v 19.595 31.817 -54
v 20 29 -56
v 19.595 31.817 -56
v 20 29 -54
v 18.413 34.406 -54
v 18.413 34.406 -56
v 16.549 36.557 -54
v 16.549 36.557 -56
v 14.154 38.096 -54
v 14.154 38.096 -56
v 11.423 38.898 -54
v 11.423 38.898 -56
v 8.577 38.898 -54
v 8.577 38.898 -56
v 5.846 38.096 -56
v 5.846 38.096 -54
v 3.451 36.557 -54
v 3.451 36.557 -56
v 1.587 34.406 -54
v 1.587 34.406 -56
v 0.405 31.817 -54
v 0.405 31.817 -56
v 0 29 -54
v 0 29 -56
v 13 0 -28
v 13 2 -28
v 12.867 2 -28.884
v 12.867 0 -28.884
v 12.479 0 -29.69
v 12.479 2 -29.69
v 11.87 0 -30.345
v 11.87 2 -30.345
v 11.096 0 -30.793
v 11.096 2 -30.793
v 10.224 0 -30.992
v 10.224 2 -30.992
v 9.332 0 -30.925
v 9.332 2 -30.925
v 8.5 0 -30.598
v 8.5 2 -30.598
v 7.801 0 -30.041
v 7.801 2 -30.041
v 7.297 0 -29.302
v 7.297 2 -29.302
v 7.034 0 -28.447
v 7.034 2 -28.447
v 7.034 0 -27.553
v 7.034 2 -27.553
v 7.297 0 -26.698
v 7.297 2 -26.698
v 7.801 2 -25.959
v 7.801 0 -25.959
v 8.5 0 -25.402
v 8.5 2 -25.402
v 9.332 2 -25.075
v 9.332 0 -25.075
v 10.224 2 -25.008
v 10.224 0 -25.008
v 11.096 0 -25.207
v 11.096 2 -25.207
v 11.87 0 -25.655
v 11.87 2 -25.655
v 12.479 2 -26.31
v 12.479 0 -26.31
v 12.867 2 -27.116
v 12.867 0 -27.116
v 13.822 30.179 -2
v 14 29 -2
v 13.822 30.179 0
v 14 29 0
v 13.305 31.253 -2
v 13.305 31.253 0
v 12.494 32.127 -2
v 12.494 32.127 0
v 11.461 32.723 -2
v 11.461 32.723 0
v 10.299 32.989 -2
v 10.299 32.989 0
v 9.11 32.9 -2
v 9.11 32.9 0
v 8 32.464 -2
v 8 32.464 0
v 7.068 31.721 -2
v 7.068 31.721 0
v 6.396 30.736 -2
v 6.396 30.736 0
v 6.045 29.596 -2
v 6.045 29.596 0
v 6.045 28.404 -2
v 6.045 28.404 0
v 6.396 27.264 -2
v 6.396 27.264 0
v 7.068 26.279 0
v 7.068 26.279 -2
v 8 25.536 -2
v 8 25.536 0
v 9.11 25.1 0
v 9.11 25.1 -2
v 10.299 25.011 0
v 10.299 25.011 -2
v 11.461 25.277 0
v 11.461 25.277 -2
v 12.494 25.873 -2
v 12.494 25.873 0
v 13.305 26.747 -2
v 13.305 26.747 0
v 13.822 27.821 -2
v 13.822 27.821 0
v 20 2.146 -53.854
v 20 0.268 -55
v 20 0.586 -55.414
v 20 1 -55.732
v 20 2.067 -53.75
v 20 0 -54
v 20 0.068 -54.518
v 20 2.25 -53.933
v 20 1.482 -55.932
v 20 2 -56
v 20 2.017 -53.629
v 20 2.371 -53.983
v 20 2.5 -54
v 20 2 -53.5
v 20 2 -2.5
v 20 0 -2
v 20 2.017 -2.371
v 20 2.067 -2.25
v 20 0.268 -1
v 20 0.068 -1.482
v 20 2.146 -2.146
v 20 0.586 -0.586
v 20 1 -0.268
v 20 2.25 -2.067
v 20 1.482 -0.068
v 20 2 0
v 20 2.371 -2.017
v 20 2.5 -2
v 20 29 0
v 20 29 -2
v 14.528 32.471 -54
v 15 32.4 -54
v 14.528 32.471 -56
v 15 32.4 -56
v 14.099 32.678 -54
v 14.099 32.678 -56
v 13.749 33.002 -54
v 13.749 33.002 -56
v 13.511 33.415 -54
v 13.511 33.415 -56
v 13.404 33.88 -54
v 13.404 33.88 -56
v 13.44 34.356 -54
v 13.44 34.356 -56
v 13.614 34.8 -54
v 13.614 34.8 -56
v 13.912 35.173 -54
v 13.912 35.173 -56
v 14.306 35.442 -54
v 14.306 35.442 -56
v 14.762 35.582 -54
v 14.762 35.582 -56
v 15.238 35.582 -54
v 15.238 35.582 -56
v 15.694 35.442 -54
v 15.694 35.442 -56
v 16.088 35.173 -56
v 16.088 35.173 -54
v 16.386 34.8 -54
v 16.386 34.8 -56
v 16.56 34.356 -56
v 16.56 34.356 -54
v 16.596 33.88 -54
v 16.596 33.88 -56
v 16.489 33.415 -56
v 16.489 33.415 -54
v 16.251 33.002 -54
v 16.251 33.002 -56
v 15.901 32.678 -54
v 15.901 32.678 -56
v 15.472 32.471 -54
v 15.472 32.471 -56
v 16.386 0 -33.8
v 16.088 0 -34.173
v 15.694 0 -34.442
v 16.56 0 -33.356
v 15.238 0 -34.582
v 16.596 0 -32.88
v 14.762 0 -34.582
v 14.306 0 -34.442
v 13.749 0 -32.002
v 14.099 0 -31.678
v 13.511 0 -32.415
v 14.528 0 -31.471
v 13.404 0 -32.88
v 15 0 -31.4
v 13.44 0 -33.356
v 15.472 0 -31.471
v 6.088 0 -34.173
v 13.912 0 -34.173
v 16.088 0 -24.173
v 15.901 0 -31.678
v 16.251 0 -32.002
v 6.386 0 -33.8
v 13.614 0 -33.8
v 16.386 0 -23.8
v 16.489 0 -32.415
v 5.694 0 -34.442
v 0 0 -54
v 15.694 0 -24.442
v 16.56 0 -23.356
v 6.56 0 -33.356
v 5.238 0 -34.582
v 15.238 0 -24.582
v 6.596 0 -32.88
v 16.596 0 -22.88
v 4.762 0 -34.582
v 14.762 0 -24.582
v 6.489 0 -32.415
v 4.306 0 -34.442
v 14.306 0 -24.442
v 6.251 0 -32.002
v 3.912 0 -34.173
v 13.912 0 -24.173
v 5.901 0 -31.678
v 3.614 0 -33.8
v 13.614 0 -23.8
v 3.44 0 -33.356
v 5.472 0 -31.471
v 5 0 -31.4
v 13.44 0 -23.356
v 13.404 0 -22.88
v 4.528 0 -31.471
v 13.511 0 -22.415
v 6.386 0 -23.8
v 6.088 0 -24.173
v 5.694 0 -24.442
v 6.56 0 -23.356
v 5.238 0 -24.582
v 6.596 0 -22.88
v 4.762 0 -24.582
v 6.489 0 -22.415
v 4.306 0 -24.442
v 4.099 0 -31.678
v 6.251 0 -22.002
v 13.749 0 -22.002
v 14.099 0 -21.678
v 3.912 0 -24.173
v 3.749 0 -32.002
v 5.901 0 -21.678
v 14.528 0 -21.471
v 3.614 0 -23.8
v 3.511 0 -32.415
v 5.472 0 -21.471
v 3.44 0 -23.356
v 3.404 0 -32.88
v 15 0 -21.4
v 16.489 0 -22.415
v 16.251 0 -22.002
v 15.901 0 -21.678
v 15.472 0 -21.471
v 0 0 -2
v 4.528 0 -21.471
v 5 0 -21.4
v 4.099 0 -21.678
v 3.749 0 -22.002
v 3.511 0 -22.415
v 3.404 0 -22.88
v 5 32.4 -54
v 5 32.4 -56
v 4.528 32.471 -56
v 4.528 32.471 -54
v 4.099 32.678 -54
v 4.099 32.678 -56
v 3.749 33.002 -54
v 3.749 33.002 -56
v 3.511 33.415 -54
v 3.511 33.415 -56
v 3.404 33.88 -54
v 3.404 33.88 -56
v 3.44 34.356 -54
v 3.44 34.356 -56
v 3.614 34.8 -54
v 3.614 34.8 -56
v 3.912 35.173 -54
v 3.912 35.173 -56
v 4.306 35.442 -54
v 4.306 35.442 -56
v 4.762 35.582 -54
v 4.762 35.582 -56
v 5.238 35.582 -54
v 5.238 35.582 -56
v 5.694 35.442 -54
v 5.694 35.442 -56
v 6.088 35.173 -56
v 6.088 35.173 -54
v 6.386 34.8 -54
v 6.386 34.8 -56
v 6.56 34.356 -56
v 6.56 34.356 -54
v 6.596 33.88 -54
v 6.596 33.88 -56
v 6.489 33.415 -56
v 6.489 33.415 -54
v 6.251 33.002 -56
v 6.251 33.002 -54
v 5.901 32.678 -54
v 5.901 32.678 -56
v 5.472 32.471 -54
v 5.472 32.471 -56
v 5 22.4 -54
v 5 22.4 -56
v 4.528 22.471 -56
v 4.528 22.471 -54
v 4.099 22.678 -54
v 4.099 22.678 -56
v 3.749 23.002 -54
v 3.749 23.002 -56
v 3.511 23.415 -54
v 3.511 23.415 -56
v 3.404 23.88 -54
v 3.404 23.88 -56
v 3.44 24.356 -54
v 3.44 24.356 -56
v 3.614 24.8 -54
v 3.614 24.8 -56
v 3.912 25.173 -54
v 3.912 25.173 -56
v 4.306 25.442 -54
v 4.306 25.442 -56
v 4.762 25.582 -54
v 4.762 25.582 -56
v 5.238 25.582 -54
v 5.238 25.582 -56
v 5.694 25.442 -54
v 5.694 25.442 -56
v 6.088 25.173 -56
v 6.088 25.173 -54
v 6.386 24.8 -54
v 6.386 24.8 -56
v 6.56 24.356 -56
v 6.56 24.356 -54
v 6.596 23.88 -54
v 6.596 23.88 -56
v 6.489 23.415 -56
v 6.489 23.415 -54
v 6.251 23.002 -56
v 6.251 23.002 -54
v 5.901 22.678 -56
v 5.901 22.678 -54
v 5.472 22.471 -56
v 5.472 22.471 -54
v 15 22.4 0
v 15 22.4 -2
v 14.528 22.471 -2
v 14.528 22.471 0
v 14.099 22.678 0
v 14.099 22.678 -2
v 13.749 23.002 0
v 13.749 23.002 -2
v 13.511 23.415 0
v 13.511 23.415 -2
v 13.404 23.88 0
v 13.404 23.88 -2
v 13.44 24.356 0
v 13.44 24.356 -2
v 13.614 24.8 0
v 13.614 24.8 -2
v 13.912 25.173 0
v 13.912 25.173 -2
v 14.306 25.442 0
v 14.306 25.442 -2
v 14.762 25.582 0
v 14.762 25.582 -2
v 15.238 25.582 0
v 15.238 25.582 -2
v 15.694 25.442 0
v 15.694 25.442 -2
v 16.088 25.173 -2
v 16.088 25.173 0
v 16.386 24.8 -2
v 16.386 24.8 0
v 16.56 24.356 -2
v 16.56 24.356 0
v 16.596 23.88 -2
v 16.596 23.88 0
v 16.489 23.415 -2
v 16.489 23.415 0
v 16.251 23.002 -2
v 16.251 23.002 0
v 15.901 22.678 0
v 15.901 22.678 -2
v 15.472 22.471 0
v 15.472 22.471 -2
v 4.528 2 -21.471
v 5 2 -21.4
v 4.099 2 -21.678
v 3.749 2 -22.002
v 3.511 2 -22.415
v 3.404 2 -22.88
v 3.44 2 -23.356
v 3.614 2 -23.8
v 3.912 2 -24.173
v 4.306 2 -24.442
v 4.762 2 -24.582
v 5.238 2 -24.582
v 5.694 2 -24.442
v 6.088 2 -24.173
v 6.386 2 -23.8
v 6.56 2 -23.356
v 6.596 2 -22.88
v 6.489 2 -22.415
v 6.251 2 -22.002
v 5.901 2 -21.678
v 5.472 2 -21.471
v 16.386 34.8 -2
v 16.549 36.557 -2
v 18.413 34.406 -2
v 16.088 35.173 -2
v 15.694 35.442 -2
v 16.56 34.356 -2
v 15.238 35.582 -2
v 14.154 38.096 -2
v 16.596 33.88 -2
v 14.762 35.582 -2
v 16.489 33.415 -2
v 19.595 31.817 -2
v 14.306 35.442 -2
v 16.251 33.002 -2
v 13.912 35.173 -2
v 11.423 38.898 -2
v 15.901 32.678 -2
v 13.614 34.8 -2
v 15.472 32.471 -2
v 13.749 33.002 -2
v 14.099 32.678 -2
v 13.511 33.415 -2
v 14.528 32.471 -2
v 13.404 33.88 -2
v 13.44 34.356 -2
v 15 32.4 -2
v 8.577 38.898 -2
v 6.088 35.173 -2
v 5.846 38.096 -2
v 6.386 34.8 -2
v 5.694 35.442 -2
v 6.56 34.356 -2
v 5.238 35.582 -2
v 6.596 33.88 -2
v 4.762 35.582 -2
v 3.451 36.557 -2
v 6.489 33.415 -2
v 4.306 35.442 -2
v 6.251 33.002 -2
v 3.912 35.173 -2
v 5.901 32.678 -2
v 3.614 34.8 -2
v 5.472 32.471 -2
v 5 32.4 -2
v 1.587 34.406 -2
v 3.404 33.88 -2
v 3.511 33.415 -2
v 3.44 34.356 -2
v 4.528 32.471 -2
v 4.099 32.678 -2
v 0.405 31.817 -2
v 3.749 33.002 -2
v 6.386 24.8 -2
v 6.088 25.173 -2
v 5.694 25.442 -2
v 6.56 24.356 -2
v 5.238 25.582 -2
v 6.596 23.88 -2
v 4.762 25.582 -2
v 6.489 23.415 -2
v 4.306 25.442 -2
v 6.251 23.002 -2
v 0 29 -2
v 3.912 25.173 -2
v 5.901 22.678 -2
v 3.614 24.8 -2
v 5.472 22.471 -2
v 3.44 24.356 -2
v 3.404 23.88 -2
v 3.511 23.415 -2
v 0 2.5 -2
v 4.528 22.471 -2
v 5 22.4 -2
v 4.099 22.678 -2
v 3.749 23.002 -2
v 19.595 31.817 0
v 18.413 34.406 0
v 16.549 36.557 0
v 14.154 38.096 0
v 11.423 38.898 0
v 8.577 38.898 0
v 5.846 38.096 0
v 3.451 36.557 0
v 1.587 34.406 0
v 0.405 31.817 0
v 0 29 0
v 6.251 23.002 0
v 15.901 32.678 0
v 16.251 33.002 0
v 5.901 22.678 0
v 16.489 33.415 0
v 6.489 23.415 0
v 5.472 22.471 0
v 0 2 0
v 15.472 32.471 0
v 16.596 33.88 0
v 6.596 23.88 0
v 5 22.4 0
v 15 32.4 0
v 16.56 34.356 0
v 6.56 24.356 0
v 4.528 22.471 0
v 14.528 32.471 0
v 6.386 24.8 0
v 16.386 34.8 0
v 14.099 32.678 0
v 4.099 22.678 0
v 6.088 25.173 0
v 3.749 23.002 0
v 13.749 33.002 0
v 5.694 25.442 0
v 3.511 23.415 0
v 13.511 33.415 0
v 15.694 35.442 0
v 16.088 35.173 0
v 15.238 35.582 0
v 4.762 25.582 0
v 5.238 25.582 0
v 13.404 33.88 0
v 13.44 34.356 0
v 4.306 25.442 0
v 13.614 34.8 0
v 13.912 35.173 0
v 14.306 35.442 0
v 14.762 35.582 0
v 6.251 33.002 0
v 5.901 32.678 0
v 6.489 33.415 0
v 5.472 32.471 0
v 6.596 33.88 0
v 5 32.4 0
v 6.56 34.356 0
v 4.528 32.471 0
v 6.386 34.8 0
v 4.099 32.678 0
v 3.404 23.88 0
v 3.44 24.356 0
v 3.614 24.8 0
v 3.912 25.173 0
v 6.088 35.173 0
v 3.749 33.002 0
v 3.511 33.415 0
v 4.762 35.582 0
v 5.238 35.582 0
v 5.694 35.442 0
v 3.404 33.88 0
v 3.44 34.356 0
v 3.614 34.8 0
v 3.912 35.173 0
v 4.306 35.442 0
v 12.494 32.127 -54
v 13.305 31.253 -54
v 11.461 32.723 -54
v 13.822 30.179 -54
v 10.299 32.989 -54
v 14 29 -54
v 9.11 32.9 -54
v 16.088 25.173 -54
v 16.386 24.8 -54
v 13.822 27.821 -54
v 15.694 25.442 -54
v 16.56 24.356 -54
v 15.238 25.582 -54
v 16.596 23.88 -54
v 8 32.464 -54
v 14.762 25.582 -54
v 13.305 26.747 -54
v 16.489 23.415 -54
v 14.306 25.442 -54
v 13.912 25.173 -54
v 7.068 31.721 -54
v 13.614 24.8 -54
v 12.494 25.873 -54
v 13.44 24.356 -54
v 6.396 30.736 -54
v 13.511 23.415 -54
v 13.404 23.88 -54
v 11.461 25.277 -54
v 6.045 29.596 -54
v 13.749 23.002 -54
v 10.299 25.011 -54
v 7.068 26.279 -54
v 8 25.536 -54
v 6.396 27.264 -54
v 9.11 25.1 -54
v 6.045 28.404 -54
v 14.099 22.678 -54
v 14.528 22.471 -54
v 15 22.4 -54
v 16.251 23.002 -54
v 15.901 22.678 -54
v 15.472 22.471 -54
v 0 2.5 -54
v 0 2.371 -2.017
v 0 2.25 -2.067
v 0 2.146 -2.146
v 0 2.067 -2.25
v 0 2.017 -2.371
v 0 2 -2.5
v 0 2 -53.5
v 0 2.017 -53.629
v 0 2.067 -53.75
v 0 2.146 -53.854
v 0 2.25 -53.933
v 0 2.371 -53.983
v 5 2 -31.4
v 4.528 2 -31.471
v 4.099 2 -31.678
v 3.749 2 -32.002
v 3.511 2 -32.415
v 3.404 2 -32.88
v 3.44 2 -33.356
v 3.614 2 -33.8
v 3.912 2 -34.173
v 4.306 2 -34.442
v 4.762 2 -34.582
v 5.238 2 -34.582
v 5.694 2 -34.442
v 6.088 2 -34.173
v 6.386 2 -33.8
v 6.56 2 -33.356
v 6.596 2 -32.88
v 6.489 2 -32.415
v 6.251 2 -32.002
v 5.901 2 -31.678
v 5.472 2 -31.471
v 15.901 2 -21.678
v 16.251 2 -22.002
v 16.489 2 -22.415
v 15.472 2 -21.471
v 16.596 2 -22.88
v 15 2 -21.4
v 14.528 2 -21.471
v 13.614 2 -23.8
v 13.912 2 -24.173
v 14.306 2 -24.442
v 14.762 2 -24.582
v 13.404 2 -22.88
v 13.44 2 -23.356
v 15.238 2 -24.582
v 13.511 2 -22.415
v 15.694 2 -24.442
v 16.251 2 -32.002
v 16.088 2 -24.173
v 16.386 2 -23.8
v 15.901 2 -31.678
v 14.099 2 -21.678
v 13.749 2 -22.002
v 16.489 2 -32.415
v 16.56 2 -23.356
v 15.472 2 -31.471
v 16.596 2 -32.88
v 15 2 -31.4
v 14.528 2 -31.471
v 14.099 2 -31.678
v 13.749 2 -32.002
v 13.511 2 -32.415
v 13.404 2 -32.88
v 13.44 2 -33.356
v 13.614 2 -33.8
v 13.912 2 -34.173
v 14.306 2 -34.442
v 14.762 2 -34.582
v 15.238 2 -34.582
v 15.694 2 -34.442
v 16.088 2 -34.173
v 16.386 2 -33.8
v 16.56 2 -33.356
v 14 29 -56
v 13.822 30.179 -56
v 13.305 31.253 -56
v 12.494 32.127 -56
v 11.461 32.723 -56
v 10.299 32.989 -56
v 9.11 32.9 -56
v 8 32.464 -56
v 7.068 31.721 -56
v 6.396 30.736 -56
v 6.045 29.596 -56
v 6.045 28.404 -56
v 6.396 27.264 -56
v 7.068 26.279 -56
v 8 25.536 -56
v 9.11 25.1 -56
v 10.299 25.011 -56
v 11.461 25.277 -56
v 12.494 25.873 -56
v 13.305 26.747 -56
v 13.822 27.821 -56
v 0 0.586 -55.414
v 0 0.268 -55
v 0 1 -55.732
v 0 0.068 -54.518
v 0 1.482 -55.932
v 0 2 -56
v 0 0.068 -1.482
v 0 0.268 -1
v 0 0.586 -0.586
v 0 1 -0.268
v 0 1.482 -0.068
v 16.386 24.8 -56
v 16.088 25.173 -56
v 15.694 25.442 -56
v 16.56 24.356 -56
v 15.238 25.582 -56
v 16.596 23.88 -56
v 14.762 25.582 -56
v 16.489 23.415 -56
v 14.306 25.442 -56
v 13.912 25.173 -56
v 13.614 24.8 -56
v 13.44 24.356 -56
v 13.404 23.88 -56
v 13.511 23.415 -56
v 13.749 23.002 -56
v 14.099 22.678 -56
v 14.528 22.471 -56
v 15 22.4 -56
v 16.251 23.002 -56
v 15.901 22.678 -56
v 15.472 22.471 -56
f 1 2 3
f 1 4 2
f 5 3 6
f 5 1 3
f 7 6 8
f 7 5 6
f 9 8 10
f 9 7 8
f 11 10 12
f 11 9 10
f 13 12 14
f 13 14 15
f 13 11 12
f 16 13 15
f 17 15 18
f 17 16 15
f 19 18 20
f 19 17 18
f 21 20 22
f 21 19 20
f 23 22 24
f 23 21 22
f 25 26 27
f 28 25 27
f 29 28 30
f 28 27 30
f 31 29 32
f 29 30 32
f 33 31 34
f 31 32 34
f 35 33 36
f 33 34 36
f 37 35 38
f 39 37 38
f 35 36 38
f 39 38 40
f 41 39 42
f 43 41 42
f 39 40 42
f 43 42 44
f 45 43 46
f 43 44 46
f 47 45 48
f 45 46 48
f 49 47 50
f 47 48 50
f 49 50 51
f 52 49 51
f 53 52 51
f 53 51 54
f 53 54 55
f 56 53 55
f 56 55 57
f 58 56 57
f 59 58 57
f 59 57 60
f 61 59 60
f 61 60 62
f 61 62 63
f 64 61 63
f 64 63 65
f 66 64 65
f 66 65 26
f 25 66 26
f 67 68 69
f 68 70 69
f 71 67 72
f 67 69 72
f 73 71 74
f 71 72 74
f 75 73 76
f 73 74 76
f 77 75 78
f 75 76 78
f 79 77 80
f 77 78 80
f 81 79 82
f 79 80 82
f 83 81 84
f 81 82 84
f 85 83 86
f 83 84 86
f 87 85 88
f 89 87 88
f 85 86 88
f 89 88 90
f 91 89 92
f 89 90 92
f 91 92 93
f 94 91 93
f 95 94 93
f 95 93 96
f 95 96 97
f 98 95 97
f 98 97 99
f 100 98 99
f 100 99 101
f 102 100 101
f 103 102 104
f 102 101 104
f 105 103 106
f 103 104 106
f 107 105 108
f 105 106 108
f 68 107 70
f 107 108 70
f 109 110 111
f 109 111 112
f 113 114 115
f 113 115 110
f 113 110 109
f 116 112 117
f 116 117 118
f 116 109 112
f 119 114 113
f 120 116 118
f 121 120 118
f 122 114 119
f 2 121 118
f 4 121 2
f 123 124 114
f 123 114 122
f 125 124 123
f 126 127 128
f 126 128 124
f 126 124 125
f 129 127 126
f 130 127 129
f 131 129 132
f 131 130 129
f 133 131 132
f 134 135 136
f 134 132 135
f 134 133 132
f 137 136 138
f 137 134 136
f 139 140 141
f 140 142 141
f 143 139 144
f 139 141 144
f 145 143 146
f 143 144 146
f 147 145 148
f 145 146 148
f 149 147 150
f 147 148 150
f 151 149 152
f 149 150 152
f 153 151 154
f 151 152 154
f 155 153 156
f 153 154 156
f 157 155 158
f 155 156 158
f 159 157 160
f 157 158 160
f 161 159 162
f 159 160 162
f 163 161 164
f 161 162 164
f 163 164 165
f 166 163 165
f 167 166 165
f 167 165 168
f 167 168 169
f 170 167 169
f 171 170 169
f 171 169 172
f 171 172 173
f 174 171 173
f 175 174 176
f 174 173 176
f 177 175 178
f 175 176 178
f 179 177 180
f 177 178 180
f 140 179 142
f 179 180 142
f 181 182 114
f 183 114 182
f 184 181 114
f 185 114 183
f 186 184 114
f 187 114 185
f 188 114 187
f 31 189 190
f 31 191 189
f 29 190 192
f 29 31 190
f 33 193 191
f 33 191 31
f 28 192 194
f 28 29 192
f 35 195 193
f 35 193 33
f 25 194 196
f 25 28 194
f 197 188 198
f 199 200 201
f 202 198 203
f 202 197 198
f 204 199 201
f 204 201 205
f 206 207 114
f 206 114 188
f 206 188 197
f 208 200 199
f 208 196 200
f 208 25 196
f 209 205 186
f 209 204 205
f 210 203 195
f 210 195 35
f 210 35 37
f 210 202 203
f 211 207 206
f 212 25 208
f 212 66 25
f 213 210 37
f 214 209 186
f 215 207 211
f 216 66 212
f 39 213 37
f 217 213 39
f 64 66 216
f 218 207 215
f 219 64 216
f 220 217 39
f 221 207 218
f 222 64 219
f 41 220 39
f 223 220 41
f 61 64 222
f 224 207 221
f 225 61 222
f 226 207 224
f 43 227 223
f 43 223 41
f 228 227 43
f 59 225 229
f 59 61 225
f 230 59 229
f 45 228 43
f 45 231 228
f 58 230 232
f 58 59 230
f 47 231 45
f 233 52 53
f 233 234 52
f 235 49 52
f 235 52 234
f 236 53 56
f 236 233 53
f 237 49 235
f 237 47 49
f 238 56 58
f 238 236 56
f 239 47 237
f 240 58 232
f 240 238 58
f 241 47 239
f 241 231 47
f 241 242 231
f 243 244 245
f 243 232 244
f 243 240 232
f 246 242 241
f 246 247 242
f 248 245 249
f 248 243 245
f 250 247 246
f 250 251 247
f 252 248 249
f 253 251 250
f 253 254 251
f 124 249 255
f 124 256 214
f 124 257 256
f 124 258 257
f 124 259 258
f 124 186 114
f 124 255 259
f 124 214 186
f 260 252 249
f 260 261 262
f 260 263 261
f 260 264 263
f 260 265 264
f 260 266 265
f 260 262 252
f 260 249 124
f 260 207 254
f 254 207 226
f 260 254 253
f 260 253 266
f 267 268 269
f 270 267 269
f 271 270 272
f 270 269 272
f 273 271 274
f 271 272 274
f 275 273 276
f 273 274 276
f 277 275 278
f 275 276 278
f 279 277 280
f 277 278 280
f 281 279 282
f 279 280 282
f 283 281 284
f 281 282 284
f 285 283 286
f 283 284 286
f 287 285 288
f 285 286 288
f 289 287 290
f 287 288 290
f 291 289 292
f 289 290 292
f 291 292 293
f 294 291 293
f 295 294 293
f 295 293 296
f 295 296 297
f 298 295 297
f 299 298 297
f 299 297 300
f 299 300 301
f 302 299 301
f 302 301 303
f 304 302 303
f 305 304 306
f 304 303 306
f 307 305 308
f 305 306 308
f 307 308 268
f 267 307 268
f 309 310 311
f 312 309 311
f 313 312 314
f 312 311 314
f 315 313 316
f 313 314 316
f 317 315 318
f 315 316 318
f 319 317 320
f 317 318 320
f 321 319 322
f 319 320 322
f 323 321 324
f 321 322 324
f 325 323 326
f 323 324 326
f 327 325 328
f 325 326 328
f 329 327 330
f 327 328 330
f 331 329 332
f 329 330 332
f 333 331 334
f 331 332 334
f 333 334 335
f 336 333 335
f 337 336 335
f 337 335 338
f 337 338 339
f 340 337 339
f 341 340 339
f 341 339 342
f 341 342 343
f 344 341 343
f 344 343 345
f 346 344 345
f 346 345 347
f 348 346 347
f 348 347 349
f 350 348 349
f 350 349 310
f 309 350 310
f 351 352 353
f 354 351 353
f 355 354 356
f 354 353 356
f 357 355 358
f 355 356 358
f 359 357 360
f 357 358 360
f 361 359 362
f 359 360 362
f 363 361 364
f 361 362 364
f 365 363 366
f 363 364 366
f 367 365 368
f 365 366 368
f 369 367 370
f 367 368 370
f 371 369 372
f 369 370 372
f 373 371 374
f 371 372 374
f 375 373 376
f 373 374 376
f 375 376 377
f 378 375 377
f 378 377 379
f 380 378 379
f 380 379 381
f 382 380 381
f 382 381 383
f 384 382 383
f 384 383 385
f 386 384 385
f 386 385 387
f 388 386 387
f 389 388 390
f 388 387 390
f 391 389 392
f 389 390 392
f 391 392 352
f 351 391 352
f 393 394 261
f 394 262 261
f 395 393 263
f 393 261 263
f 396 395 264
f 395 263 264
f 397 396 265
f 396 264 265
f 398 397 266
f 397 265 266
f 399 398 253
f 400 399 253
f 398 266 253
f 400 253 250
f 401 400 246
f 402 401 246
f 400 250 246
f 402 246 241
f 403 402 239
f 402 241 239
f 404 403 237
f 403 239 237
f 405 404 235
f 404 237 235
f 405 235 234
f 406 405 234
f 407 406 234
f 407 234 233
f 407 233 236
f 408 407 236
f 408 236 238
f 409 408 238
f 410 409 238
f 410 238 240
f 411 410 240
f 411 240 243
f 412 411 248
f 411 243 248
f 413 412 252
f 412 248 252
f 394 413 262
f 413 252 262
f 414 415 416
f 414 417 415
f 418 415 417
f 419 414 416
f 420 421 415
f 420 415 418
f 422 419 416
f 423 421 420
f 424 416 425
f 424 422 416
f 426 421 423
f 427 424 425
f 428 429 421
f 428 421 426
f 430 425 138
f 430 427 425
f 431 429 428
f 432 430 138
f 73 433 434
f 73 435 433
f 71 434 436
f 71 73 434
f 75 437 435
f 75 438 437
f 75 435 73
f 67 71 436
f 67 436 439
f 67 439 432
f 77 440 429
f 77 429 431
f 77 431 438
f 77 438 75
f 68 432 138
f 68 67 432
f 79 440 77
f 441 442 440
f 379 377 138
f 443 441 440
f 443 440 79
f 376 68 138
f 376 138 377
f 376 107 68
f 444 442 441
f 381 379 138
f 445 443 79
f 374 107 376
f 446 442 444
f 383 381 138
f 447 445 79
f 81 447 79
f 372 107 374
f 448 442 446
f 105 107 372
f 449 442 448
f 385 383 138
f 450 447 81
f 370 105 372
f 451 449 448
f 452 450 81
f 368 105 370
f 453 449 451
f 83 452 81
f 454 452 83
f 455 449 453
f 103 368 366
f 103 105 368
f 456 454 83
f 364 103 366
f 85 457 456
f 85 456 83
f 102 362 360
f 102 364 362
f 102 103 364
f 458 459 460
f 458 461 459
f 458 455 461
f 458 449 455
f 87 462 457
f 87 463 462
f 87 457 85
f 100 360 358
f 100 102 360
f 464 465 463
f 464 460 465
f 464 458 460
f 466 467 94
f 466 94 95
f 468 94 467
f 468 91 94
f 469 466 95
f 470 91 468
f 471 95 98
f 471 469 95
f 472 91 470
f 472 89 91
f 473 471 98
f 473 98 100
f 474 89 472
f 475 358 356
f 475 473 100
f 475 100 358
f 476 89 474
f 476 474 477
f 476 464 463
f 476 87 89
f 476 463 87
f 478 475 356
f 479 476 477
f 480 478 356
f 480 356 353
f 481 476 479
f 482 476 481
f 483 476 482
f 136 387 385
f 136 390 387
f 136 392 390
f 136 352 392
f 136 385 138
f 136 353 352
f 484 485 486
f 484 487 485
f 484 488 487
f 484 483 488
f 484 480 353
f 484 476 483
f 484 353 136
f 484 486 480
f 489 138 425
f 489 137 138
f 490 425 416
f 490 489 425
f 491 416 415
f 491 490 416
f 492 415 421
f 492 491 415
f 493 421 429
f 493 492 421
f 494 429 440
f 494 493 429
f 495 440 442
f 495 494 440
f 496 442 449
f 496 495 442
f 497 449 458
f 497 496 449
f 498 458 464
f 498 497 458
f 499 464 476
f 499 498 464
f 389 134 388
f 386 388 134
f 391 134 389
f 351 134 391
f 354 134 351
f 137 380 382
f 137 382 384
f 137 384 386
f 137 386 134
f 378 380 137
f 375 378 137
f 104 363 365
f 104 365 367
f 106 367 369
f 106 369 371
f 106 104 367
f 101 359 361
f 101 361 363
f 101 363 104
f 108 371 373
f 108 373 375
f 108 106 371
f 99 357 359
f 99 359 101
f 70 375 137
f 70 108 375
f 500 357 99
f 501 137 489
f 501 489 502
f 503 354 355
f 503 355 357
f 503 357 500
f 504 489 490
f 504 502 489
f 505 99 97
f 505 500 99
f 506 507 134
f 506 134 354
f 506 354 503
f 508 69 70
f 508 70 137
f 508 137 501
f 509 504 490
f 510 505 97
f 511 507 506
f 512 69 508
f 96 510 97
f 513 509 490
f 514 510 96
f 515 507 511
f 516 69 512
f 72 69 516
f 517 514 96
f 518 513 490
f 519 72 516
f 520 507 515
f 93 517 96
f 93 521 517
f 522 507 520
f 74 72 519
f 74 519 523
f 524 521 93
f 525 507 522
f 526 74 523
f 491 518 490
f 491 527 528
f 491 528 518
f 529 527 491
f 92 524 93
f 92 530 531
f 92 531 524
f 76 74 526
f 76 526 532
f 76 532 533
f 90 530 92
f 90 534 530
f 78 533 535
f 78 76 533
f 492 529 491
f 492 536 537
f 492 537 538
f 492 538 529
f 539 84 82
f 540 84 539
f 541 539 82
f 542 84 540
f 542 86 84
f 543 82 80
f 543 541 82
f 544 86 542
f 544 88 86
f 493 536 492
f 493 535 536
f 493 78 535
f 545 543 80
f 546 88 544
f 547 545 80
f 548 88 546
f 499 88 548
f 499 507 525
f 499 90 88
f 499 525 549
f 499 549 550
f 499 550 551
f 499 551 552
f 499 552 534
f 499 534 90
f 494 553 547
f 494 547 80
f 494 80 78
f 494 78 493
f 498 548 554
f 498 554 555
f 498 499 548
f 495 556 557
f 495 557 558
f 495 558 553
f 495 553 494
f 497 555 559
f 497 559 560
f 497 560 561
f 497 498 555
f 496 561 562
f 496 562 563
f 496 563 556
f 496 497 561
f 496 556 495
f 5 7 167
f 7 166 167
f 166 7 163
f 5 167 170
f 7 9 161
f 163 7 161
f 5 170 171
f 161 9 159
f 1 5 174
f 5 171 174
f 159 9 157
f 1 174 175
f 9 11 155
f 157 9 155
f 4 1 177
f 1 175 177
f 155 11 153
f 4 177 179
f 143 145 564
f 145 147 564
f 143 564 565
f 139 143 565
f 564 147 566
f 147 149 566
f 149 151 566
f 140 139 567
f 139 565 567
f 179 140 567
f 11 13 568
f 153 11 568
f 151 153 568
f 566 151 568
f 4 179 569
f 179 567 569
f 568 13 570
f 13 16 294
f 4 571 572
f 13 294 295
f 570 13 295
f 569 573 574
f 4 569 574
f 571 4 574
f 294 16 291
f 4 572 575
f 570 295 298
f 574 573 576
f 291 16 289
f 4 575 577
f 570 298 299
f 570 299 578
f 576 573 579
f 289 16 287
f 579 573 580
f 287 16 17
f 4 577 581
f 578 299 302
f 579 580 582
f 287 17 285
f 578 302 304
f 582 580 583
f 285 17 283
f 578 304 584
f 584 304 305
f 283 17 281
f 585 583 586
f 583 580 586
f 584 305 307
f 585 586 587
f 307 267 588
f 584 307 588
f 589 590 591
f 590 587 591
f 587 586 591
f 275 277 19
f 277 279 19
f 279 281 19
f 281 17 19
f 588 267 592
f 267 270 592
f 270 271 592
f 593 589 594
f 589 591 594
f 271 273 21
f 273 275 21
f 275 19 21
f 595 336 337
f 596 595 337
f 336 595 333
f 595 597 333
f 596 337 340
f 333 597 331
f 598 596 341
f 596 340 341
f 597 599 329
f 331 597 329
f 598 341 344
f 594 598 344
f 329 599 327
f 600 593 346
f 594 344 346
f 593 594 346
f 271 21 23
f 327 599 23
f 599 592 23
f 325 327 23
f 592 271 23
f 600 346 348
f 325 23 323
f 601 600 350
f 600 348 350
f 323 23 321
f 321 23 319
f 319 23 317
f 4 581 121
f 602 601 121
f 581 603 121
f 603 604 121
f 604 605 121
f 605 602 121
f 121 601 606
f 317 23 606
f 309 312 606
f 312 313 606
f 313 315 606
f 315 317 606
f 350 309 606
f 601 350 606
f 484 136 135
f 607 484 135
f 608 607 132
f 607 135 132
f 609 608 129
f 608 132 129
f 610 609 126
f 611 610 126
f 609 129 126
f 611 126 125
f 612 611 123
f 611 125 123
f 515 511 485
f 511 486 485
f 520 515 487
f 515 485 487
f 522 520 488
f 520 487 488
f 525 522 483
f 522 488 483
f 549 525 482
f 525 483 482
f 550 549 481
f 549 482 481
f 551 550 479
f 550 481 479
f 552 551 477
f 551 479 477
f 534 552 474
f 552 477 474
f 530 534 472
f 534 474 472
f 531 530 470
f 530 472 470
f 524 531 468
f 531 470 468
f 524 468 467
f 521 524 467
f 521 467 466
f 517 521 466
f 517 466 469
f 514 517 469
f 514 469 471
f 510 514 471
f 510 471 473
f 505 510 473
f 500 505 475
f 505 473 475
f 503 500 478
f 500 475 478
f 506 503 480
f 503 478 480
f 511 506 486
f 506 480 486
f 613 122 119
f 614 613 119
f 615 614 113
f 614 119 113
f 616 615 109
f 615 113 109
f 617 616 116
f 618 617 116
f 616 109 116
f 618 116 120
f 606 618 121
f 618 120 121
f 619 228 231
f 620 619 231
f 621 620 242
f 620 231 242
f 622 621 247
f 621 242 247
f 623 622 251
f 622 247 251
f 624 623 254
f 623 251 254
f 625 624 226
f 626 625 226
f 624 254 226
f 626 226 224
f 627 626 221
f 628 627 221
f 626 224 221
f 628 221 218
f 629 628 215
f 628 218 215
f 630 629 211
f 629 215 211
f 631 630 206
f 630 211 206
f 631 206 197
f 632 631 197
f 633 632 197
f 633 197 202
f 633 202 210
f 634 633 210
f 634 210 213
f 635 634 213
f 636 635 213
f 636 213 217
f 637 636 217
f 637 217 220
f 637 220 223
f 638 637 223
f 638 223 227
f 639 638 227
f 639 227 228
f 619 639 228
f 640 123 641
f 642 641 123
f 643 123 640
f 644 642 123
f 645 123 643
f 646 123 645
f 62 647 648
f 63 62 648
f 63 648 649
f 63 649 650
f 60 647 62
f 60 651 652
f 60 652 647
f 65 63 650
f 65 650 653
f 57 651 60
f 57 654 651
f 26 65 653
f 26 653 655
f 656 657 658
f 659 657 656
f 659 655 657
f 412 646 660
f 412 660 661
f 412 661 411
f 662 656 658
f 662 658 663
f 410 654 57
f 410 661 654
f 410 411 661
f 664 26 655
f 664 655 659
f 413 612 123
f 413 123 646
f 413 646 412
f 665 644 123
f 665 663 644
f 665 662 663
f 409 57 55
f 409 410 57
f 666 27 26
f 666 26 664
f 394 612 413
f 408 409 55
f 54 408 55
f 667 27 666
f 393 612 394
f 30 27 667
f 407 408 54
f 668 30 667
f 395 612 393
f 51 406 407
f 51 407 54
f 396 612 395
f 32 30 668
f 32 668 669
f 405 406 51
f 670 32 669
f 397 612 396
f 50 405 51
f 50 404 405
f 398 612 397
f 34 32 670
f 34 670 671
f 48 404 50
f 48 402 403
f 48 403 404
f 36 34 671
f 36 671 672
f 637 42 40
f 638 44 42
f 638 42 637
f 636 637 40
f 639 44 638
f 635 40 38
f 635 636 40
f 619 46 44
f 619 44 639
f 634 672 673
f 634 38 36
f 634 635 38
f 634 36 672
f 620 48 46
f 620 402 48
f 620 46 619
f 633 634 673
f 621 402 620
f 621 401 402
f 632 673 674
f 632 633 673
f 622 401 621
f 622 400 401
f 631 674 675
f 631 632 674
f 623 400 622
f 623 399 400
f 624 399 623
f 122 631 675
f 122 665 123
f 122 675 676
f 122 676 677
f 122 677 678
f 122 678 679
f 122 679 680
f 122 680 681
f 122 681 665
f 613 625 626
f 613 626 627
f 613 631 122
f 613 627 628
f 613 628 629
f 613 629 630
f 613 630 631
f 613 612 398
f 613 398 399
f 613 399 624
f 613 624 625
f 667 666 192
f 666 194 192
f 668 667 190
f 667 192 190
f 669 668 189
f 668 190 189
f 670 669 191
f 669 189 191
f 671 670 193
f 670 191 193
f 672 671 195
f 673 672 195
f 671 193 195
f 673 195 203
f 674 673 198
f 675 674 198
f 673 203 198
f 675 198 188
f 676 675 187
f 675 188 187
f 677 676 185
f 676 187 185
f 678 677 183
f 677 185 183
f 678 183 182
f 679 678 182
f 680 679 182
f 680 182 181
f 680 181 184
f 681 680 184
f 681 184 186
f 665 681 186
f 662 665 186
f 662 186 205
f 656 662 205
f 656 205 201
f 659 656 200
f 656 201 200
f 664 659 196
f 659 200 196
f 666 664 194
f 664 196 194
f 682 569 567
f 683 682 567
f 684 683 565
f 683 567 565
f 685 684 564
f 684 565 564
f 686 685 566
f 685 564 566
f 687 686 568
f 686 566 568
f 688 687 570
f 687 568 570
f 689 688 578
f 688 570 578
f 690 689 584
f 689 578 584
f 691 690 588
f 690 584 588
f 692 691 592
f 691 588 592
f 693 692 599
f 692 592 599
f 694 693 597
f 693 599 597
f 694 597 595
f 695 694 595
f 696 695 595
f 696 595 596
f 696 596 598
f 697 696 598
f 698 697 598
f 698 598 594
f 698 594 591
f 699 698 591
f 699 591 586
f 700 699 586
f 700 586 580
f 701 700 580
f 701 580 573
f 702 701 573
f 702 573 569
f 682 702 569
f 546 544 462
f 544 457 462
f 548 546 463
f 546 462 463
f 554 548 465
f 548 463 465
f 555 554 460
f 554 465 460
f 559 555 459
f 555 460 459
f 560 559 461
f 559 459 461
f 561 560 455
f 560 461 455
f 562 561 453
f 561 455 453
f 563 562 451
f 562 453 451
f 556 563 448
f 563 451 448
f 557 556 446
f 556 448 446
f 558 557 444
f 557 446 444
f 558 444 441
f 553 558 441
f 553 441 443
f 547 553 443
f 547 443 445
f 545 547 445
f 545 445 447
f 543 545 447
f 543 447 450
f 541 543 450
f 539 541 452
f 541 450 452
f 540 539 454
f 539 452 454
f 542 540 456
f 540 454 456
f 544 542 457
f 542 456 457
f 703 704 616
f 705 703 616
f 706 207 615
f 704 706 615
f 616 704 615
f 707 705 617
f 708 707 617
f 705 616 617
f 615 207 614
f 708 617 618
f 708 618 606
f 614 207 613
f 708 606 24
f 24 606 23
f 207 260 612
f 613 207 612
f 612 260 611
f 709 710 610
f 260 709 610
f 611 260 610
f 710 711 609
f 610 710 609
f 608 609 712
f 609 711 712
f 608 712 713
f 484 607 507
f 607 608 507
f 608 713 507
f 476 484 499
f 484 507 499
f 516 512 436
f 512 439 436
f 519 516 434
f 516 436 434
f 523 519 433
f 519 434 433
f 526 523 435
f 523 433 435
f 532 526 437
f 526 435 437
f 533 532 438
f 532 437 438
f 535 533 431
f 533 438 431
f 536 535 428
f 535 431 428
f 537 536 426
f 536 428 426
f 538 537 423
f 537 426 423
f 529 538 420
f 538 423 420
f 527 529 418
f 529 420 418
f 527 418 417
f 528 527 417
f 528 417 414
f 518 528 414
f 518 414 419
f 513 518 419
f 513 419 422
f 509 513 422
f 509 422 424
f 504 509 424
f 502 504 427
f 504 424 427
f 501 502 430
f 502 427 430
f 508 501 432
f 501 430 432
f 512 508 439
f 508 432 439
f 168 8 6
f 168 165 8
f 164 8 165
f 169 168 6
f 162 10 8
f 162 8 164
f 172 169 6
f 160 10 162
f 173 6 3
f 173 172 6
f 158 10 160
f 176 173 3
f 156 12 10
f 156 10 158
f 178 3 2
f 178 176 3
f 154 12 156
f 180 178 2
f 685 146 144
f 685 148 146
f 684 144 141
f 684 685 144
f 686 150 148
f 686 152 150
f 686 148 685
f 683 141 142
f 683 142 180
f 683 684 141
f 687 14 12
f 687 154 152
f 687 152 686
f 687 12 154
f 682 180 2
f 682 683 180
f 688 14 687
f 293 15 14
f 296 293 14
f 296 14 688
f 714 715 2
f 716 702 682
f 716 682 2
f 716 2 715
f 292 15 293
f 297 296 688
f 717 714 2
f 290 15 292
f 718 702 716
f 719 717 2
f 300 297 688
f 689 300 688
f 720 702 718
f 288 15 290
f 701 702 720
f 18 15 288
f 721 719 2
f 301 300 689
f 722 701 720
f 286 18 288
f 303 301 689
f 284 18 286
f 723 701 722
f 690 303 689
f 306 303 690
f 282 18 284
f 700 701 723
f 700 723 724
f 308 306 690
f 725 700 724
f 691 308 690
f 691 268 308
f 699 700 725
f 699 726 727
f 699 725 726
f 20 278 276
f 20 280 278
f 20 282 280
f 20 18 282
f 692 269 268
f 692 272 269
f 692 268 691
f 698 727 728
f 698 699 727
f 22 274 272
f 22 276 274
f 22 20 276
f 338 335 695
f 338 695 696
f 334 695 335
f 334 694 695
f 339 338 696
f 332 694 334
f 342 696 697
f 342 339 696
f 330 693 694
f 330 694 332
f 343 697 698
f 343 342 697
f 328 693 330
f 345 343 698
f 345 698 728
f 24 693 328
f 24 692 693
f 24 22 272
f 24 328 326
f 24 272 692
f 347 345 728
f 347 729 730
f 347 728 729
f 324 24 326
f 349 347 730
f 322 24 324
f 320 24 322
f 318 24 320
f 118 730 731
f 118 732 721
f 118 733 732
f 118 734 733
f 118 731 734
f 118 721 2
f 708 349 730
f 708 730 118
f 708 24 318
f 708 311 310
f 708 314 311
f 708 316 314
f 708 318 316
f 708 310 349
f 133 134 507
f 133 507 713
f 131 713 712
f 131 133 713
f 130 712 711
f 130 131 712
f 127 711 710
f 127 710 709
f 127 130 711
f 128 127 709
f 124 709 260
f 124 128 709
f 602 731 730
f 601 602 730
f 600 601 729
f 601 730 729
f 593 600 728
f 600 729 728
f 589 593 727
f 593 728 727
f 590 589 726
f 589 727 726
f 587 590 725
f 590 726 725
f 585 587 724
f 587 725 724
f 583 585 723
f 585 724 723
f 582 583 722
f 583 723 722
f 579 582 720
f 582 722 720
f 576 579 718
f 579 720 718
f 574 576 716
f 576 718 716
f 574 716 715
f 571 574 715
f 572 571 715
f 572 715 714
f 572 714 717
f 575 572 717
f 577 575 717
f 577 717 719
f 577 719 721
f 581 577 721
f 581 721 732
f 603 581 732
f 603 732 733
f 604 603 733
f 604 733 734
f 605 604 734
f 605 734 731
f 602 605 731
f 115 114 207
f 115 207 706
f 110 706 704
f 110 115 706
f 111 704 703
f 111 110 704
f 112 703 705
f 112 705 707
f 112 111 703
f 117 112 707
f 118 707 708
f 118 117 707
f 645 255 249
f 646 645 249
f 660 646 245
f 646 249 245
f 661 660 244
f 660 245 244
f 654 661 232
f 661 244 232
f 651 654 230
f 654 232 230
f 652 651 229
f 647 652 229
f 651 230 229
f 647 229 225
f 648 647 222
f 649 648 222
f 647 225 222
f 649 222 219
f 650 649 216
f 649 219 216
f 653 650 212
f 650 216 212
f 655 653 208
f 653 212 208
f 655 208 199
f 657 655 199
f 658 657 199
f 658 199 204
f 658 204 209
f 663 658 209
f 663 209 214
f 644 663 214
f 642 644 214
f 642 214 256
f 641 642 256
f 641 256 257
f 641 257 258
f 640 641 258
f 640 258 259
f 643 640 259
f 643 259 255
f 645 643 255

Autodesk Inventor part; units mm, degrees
ref_plane "YZ Plane" through (0, 0, 0) normal (1, 0, 0) x (0, 1, 0)
ref_plane "XZ Plane" through (0, 0, 0) normal (0, 1, 0) x (-1, 0, 0)
ref_plane "XY Plane" through (0, 0, 0) normal (0, 0, 1) x (1, 0, 0)
sketch "スケッチ1" plane through (0, 0, 0) normal (1, 0, 0) x (0, 1, 0)
  line L0 (0, 0) -> (2, 0)
  line L1 (2, 0) -> (2, -56)
  line L2 (2, -56) -> (0, -56)
  line L3 (0, -56) -> (0, 0)
  line L4 (2, 0) -> (39, 0)
  line L5 (39, 0) -> (39, -2)
  line L6 (39, -2) -> (2, -2)
  line L7 (2, -2) -> (2, 0)
  line L8 (2, -56) -> (39, -56)
  line L9 (39, -56) -> (39, -54)
  line L10 (39, -54) -> (2, -54)
  line L11 (2, -54) -> (2, -56)
  point P0 (2, -54)
  point P1 (2, -2)
  dimension "d0" = 2
  dimension "d1" = 56
  dimension "d2" = 37
  dimension "d3" = 2
  dimension "d4" = 37
  dimension "d5" = 2
extrude "押し出し1" add sketch "スケッチ1" along normal blind 20
sketch "スケッチ2" plane through (0, 0, 0) normal (0, 0, 1) x (1, 0, 0)
  arc A0 (20, 29) -> (0, 29) centre (10, 29) ccw
  line L0 (0, 39) -> (20, 39) projected
  line L1 (0, 39) -> (0, 0) projected
  line L2 (20, 39) -> (20, 0) projected
  point P0 (10, 39)
  dimension "d8" = 10
extrude "押し出し2" cut sketch "スケッチ2" against normal through all
sketch "スケッチ3" plane through (0, 0, 0) normal (0, 0, 1) x (1, 0, 0)
  arc A0 (20, 29) -> (0, 29) centre (10, 29) ccw projected
  point P0 (0, 0)
  point P1 (5, 34)
  point P2 (15, 34)
  point P3 (15, 24)
  point P4 (5, 24)
  dimension "d11" = 5
  dimension "d12" = 5
  dimension "d13" = 10
  dimension "d14" = 10
hole "穴1" at (5, 34, 0) at (15, 34, 0) at (15, 24, 0) at (5, 24, 0) direction (0, 0, -1) diameter 3.2 end through all
sketch "スケッチ4" plane through (0, 0, 0) normal (0, 0, 1) x (1, 0, 0)
  arc A0 (20, 29) -> (0, 29) centre (10, 29) ccw projected
  circle A1 centre (10, 29) radius 4
  point P0 (0, 0)
  dimension "d22" = 8
extrude "押し出し3" cut sketch "スケッチ4" against normal through all
fillet "フィレット1" radius 0.5 2 edges at (10, 2, -54) (10, 2, -2)
fillet "フィレット2" radius 2 2 edges at (10, 0, -56) (10, 0, 0)
sketch "スケッチ5" plane through (0, 2, -2.5) normal (0, 1, 0) x (1, 0, 0)
  line L0 (0, -0.5) -> (0, 51.5) projected
  line L1 (0, 25.5) -> (20, 25.5)
  line L2 (20, 51) -> (20, 0) projected
  line L3 (20, 51.5) -> (0, 51.5) projected
  line L4 (10, 51.5) -> (10, 0)
  line L5 (20, 0) -> (0, 0) projected
  point P0 (0, -2.5)
  point P1 (5, 30.5)
  point P2 (15, 30.5)
  point P3 (15, 20.5)
  point P4 (5, 20.5)
  dimension "d27" = 10
  dimension "d28" = 10
hole "穴2" at (5, 2, -33) at (15, 2, -33) at (15, 2, -23) at (5, 2, -23) direction (0, -1, 0) diameter 3.2 end through all
sketch "スケッチ6" plane through (0, 2, -2.5) normal (0, 1, 0) x (1, 0, 0)
  circle A0 centre (10, 25.5) radius 3
  circle A1 centre (5, 20.5) radius 1.6 projected
  point P0 (0, -2.5)
  dimension "d36" = 6
  dimension "d37" = 5
  dimension "d38" = 5
extrude "押し出し4" cut sketch "スケッチ6" against normal through all contours A0
properties part number "サーボモーター25kgcmサーボホーン2" material "アルミニウム 6061"
